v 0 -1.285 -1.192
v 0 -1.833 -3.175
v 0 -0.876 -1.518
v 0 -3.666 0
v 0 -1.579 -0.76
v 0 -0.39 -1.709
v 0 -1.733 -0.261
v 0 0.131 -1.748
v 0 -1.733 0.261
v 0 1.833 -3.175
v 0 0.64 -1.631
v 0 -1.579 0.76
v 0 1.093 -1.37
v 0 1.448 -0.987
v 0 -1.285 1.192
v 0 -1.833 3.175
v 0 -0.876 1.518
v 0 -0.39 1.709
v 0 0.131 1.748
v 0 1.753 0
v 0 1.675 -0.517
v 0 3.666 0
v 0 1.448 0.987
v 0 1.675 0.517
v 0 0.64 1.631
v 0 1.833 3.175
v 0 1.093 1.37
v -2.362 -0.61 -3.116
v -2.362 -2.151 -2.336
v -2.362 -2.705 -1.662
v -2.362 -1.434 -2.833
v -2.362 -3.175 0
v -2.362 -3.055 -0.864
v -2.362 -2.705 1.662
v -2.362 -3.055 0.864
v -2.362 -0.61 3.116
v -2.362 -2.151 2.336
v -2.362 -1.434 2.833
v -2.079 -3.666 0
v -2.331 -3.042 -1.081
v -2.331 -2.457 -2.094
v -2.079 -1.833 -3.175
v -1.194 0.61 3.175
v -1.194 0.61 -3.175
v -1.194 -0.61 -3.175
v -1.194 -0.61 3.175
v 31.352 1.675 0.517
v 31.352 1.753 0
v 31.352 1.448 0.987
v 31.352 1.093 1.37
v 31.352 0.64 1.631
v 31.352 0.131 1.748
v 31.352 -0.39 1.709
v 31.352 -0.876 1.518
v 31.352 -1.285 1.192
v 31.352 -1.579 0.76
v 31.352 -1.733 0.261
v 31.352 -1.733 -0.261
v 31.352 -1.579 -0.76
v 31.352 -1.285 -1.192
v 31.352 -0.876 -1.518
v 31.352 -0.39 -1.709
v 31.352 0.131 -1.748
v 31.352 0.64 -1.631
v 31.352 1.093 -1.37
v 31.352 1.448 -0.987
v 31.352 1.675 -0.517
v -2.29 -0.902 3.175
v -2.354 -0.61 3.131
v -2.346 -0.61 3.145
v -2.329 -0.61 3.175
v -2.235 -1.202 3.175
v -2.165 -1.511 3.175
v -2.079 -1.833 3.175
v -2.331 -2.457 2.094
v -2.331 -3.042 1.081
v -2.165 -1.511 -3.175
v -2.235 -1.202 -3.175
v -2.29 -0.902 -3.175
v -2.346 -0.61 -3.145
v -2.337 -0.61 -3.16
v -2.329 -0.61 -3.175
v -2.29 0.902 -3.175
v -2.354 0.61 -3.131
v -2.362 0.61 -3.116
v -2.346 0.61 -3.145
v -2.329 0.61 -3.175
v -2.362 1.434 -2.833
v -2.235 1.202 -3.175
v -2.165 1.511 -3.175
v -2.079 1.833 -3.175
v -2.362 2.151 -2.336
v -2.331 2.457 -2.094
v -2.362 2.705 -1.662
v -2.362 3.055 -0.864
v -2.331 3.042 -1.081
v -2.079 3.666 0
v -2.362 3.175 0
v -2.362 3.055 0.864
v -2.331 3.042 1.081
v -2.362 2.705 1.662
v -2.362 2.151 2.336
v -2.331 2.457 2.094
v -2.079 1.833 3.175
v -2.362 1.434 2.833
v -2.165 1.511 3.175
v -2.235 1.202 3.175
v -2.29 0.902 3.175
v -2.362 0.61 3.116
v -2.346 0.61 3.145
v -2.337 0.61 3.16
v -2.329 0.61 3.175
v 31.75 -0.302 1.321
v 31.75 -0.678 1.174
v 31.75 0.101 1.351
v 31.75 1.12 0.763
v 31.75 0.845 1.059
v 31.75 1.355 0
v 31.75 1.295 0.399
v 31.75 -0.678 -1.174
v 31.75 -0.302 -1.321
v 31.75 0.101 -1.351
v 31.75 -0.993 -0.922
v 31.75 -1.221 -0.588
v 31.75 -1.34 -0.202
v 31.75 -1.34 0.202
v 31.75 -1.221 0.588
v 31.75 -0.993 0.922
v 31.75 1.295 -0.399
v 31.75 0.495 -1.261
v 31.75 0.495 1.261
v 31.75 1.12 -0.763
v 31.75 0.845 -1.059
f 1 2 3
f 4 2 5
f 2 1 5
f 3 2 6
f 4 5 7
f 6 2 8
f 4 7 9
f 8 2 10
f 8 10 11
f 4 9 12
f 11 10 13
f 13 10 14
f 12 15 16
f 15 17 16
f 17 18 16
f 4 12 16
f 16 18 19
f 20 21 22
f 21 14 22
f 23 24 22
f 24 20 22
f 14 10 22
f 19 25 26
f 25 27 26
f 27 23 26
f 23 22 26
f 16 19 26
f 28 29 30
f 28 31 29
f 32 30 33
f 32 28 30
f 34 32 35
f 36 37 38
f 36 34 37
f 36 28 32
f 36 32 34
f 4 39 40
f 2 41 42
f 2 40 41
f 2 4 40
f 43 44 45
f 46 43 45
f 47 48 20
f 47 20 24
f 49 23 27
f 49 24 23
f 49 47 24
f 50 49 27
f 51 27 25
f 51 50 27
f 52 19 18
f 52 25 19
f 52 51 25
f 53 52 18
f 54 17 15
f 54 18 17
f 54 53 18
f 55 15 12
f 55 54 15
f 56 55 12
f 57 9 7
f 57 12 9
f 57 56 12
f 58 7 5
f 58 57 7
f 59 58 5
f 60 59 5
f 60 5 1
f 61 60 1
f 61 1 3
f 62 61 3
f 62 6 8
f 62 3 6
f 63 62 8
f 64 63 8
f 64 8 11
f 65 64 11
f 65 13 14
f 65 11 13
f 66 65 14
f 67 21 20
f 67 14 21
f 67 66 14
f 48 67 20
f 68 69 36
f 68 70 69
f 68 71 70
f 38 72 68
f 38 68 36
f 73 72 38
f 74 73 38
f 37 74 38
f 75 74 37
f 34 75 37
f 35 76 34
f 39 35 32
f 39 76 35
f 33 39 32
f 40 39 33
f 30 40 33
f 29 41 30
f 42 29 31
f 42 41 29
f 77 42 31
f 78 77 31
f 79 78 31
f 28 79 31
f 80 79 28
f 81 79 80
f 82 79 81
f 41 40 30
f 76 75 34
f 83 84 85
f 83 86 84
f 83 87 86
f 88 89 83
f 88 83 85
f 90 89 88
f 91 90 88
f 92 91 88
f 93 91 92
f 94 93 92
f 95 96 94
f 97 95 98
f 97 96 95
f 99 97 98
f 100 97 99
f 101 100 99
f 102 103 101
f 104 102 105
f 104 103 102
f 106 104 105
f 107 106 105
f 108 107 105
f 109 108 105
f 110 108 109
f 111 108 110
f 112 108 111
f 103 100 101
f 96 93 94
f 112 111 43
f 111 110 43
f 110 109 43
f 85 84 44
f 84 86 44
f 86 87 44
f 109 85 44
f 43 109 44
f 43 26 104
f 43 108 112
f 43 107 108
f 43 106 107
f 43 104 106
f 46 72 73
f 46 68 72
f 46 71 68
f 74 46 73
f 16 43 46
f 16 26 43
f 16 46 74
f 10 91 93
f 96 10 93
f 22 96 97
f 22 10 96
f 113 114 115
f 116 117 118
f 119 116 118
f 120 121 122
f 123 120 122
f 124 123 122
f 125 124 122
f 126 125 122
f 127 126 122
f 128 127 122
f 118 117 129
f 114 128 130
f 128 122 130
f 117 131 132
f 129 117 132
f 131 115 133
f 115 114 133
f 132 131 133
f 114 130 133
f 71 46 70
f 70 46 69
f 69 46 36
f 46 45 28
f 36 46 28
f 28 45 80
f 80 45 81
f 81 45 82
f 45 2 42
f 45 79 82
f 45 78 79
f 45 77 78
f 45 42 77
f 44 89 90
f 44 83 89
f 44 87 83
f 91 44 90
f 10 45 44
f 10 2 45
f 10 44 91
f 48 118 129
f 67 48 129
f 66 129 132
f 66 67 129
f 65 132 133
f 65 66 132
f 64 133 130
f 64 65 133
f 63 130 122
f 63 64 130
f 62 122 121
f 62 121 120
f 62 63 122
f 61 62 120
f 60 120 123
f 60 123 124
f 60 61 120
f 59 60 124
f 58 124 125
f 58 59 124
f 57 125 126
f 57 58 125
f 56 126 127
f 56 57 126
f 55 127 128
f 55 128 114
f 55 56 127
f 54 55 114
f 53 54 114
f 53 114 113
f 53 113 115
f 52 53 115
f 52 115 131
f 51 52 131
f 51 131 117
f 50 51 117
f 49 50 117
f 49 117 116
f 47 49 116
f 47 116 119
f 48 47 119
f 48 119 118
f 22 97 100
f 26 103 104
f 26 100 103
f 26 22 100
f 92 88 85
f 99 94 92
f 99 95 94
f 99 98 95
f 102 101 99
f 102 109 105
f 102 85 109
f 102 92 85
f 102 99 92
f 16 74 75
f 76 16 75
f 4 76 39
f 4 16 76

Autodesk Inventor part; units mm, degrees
ref_plane "YZ Plane" through (0, 0, 0) normal (1, 0, 0) x (0, 1, 0)
ref_plane "XZ Plane" through (0, 0, 0) normal (0, 1, 0) x (-1, 0, 0)
sketch "Boceto1" plane through (0, 0, 0) normal (0, 0, 1) x (1, 0, 0)
  line L0 (0, 1.7526) -> (31.75, 1.7526)
  line L1 (31.75, 1.7526) -> (31.75, 0)
  line L2 (31.75, 0) -> (0, 0)
  line L3 (-6.35, 0) -> (38.1, 0) projected
  line L4 (0, -0.3505) -> (0, 2.1031) projected
  line L5 (0, 1.7526) -> (0, 0)
  dimension "d1" = 3.5052
  dimension "d52" = 31.75
revolve "Cuerpo" add sketch "Boceto1" angle 360 about axis through (31.75, 0, 0) along (-1, 0, 0)
sketch "Boceto2" plane through (0, 0, 0) normal (-1, 0, 0) x (0, 0, 1)
  line L0 (0, 3.6662) -> (3.175, 1.8331)
  line L1 (3.175, 1.8331) -> (3.175, -1.8331)
  line L2 (3.175, -1.8331) -> (0, -3.6662)
  line L3 (0, -3.6662) -> (-3.175, -1.8331)
  line L4 (-3.175, -1.8331) -> (-3.175, 1.8331)
  line L5 (-3.175, 1.8331) -> (0, 3.6662)
  line L6 (-4.445, 0) -> (4.445, 0) projected
  line L7 (0, 5.1326) -> (0, -5.1326) projected
  point P0 (0, 0)
  point P1 (0, 0)
  dimension "d10" = 6.35
extrude "Cabeza" add sketch "Boceto2" along normal blind 2.3622
sketch "Boceto3" plane through (0, 0, 0) normal (0, 0, 1) x (1, 0, 0)
  line L0 (-2.3622, 0.6096) -> (-1.1938, 0.6096)
  line L1 (-1.1938, 0.6096) -> (-1.1938, -0.6096)
  line L2 (-1.1938, -0.6096) -> (-2.3622, -0.6096)
  line L3 (-2.3622, -0.6096) -> (-2.3622, 0.6096)
  line L4 (-1.1938, 0) -> (-2.3622, 0) construction
  line L5 (-2.5959, 0) -> (-0.9601, 0) projected
  line L6 (-2.3622, 1.8331) -> (-2.3622, -1.8331) projected
  dimension "d11" = 1.2192
  dimension "d13" = 1.1684
extrude "Ranura" cut sketch "Boceto3" along normal through all both and the other way through all
sketch "Boceto4" plane through (0, 0, 0) normal (0, 0, 1) x (1, 0, 0)
  line L0 (-2.3622, 3.175) -> (-2.3622, 3.6662)
  line L1 (-2.3622, 3.6662) -> (-2.0786, 3.6662)
  line L2 (-2.0786, 3.6662) -> (-2.3622, 3.175)
  line L3 (-2.0786, 3.6662) -> (-2.3622, 3.6662)
  line L4 (-2.3622, 3.6662) -> (-2.3622, 3.175)
  line L5 (-2.3622, 3.6662) -> (-2.3622, 1.8331) projected
  line L6 (-2.8346, 0) -> (0.4724, 0) projected
  line L7 (0, 3.6662) -> (-2.3622, 3.6662) projected
  dimension "d4" = 30
  dimension "d17" = 6.35
revolve "Chaflán1" cut sketch "Boceto4" angle 360 about axis through (-10, 0, 0) along (1, 0, 0)
thread "Rosca" size "6-32 UNC" class "2A" standard "ANSI Unified Screw Threads" length 31.2623
chamfer "Chaflán2" distance 0.3975 distance2 0.3976 1 edges at (31.75, -1.7526, 0) measured on face at (31.75, 0.2072, -0.5462)
ref_plane "Work Plane1" through (60, 0, 0) normal (0, 0, 1) x (1, 0, 0)
equation "\"d1\" = GD"
equation "\"d52\" = NLG"
equation "\"d10\" = SW"
equation "\"d2\" = KOH - SD"
equation "\"d11\" = SBR"
equation "\"d13\" = STI"
equation "\"d4\" = ANG1"
equation "\"d17\" = SW0"
equation "\"d15\" = GEL"
equation "\"d5\" = -0.5 * SPD + 0.5 * GD"
equation "\"NLG\" = 31.75"
equation "\"GD\" = NND"
equation "\"KOH\" = 2.3622"
equation "\"GEL\" = 31.26232"
equation "\"SW\" = 6.35"
equation "\"SW0\" = 6.35"
equation "\"SPD\" = GD1"
equation "\"SD2\" = NND"
equation "\"SD\" = 0"
equation "\"ANG1\" = 30deg"
equation "\"GUL\" = -0.5 * GD1 + 0.5 * NND"
equation "\"STI\" = 1.1684"
equation "\"SBR\" = 1.2192"
equation "\"RR\" = 0.39751"
equation "\"THREADDIA\" = 3.5052"
equation "\"TOA\" = 30deg"
equation "\"BDM\" = NND"
equation "\"FAWI\" = 45deg"
equation "\"NND\" = 3.5052"
equation "\"E0\" = 1.155 * SW"
equation "\"GAL\" = 0.39751"
equation "\"GD1\" = 2.71018"
properties part number "ANSI B18.6.3 - Nº 6 - 32 x 1 1/4" material "Acero, suave"
